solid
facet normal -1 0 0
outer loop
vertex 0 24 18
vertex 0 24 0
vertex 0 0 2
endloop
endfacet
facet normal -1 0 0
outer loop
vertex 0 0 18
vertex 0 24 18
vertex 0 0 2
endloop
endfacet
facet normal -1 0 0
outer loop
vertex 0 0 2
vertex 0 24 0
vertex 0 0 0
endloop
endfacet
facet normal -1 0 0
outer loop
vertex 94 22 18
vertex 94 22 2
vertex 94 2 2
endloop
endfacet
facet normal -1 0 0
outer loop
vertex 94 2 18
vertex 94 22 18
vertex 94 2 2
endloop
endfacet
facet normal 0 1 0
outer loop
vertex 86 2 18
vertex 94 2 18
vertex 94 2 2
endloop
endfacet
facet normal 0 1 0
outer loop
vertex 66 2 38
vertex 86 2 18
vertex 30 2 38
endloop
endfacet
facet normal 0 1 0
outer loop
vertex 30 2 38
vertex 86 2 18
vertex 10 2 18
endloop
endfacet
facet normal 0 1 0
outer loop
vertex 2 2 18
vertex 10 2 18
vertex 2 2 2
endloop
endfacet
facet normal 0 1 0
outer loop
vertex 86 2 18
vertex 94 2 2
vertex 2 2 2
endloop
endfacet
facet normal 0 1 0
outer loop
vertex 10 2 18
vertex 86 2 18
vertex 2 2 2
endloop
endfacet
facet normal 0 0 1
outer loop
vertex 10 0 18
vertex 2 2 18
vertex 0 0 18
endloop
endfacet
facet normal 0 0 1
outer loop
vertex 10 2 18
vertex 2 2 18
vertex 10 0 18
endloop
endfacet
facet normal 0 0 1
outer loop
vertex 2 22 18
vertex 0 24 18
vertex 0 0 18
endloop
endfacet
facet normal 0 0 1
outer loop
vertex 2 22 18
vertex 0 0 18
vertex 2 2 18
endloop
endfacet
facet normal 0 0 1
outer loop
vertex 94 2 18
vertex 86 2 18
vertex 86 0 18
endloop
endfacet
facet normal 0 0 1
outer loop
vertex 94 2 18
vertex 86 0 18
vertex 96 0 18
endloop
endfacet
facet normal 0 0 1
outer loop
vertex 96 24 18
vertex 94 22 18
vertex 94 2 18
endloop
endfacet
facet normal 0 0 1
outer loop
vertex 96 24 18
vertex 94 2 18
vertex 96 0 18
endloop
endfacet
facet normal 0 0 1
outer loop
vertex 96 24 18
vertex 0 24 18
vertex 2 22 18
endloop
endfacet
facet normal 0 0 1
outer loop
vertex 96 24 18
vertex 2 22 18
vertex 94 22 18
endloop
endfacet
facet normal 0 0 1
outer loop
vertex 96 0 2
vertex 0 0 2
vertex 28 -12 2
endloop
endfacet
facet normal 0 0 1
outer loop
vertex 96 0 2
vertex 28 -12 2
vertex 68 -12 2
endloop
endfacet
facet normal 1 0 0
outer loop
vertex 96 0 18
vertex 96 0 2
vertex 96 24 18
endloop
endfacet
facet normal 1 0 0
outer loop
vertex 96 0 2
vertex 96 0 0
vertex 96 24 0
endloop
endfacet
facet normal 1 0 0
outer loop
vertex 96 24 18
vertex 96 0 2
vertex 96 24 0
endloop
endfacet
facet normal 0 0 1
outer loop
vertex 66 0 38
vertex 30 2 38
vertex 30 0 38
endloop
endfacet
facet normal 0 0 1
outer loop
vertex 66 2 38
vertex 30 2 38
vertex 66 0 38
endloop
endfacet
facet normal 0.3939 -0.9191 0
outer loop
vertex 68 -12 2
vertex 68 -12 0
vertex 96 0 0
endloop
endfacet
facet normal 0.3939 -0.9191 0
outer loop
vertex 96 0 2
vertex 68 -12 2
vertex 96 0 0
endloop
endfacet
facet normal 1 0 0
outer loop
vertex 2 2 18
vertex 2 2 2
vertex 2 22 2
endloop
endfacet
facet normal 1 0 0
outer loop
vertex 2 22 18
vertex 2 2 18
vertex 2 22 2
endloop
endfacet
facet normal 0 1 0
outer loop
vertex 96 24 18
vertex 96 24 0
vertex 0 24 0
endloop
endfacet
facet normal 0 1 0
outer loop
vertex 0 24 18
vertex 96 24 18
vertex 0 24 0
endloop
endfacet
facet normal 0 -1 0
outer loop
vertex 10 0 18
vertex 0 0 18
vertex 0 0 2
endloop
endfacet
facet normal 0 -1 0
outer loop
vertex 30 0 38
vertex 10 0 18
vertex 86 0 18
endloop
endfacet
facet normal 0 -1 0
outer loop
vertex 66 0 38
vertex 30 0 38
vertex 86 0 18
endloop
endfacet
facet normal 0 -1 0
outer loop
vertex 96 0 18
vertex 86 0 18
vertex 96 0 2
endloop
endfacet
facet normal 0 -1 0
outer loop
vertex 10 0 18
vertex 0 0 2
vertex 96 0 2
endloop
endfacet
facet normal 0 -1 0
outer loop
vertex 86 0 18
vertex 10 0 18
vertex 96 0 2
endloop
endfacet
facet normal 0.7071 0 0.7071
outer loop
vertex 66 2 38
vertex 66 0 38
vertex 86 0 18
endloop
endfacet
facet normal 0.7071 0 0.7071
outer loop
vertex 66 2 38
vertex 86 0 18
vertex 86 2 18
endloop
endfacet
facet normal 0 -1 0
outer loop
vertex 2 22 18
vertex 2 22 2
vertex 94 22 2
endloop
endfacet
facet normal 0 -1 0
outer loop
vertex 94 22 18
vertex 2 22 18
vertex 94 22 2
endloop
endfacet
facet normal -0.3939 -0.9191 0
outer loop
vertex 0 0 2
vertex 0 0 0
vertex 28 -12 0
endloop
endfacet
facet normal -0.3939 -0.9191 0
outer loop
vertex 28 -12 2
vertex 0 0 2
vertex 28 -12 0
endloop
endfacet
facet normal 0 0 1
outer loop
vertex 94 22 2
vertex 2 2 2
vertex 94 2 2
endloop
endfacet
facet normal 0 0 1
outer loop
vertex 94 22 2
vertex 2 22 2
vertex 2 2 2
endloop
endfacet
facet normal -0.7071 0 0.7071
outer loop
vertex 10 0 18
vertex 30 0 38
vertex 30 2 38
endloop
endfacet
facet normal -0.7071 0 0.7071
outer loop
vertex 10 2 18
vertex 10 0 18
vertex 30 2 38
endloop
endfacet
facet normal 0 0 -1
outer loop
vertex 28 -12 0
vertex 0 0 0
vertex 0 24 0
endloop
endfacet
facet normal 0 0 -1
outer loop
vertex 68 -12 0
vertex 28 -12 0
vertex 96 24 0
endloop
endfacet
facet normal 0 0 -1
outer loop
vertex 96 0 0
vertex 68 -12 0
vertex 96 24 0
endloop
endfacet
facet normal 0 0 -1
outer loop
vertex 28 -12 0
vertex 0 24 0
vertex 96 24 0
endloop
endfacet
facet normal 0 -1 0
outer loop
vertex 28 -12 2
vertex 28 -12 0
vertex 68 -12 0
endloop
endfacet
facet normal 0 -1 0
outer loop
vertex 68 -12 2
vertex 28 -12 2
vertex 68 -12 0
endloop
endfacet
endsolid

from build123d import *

# Parameters (mm, degrees)
F0_W     = 96
F0_H     = 24
F1_DEPTH = 2
F2_W     = 36
F2_H     = 2
F3_DEPTH = 36
F2_W_2   = 92
F2_W_3   = 2
F2_H_2   = 20
F2_W_4   = 28
F4_DEPTH = 16
F5_SIZE  = 19.99999
F6_DEPTH = 2


# Not quite as in the source:
# - a fillet or chamfer is up to 0.001 mm smaller than in the source, because OpenCascade refuses the exact size


with BuildPart() as f1:
    # F0 (on Top) → F1 (new body)
    with BuildSketch(Plane.XY):
        with Locations((48, 12)):
            Rectangle(F0_W, F0_H)
    extrude(amount=F1_DEPTH)

    # F2 (on face) → F3 (join)
    with BuildSketch(Plane.XY.offset(2)):
        with Locations((48, 1)):
            Rectangle(F2_W, F2_H)
    extrude(amount=F3_DEPTH)

    # F2 (on face) → F4 (join)
    with BuildSketch(Plane.XY.offset(2)):
        with Locations((48, 23)):
            Rectangle(F2_W_2, F2_H)
        with Locations((95, 23)):
            Rectangle(F2_W_3, F2_H)
        with Locations((48, 1)):
            Rectangle(F2_W, F2_H)
        with Locations((95, 12)):
            Rectangle(F2_W_3, F2_H_2)
        with Locations((95, 1)):
            Rectangle(F2_W_3, F2_H)
        Polygon((2, 22), (2, 24), (0, 24), (0, 2), (2, 2), align=None)
        with Locations((1, 1)):
            Rectangle(F2_W_3, F2_H)
        with Locations((16, 1)):
            Rectangle(F2_W_4, F2_H)
        with Locations((80, 1)):
            Rectangle(F2_W_4, F2_H)
    extrude(amount=F4_DEPTH)

    # F5 (size 20 in the source; OpenCascade refuses exactly that, so slightly less here)
    f5_edges = [f1.edges().sort_by_distance(p)[0] for p in [
        (30, 1, 18),
        (66, 1, 18),
    ]]
    chamfer(f5_edges, length=F5_SIZE)

    # F0 (on Top) → F6 (join, through all)
    with BuildSketch(Plane.XY):
        Polygon((96, 0), (0, 0), (28, -12), (68, -12), align=None)
    extrude(amount=F6_DEPTH)


solid = f1.part
